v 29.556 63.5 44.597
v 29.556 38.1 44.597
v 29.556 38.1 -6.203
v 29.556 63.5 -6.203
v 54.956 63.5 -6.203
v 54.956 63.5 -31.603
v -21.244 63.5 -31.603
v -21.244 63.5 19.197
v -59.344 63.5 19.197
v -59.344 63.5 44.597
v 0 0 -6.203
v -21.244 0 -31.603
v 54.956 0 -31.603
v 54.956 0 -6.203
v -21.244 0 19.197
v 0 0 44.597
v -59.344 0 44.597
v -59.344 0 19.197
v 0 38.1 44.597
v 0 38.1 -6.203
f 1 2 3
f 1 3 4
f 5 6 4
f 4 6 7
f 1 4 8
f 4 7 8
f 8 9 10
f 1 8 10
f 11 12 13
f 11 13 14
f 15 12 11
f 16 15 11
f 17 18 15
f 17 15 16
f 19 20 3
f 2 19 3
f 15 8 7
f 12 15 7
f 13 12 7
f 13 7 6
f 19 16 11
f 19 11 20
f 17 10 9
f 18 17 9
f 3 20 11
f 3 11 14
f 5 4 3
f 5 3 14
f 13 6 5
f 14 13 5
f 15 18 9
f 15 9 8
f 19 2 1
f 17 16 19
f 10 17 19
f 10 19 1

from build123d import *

# Parameters (mm, degrees)
F1_DEPTH = 63.5
F2_W     = 63.5
F2_H     = 50.8
F3_DEPTH = 25.4
F4_W     = 29.5556526983
F4_H     = 38.1
F5_DEPTH = 50.8


with BuildPart() as f1:
    # F0 (on Front) → F1 (new body)
    with BuildSketch(Plane.XZ):
        Polygon((-59.3443473017, 44.5968605516), (-59.3443473017, 19.1968605516), (-21.2443494164, 19.1968605516), (-21.2443494164, -31.6031394484), (54.9556526983, -31.6031394484), (54.9556526983, -6.2031394484), (4.1556526983, -6.2031394484), (4.1556526983, 44.5968605516), align=None)
    extrude(amount=-F1_DEPTH)

    # F2 (on face) → F3 (join)
    with BuildSketch(Plane.YZ.offset(4.1556526983)):
        with Locations((31.75, 19.1968605516)):
            Rectangle(F2_W, F2_H)
    extrude(amount=F3_DEPTH)

    # F4 (on face) → F5 (cut)
    with BuildSketch(Plane.XY.offset(44.5968605516)):
        with Locations((14.7778263491, 19.05)):
            Rectangle(F4_W, F4_H)
    extrude(amount=-F5_DEPTH, mode=Mode.SUBTRACT)


solid = f1.part
